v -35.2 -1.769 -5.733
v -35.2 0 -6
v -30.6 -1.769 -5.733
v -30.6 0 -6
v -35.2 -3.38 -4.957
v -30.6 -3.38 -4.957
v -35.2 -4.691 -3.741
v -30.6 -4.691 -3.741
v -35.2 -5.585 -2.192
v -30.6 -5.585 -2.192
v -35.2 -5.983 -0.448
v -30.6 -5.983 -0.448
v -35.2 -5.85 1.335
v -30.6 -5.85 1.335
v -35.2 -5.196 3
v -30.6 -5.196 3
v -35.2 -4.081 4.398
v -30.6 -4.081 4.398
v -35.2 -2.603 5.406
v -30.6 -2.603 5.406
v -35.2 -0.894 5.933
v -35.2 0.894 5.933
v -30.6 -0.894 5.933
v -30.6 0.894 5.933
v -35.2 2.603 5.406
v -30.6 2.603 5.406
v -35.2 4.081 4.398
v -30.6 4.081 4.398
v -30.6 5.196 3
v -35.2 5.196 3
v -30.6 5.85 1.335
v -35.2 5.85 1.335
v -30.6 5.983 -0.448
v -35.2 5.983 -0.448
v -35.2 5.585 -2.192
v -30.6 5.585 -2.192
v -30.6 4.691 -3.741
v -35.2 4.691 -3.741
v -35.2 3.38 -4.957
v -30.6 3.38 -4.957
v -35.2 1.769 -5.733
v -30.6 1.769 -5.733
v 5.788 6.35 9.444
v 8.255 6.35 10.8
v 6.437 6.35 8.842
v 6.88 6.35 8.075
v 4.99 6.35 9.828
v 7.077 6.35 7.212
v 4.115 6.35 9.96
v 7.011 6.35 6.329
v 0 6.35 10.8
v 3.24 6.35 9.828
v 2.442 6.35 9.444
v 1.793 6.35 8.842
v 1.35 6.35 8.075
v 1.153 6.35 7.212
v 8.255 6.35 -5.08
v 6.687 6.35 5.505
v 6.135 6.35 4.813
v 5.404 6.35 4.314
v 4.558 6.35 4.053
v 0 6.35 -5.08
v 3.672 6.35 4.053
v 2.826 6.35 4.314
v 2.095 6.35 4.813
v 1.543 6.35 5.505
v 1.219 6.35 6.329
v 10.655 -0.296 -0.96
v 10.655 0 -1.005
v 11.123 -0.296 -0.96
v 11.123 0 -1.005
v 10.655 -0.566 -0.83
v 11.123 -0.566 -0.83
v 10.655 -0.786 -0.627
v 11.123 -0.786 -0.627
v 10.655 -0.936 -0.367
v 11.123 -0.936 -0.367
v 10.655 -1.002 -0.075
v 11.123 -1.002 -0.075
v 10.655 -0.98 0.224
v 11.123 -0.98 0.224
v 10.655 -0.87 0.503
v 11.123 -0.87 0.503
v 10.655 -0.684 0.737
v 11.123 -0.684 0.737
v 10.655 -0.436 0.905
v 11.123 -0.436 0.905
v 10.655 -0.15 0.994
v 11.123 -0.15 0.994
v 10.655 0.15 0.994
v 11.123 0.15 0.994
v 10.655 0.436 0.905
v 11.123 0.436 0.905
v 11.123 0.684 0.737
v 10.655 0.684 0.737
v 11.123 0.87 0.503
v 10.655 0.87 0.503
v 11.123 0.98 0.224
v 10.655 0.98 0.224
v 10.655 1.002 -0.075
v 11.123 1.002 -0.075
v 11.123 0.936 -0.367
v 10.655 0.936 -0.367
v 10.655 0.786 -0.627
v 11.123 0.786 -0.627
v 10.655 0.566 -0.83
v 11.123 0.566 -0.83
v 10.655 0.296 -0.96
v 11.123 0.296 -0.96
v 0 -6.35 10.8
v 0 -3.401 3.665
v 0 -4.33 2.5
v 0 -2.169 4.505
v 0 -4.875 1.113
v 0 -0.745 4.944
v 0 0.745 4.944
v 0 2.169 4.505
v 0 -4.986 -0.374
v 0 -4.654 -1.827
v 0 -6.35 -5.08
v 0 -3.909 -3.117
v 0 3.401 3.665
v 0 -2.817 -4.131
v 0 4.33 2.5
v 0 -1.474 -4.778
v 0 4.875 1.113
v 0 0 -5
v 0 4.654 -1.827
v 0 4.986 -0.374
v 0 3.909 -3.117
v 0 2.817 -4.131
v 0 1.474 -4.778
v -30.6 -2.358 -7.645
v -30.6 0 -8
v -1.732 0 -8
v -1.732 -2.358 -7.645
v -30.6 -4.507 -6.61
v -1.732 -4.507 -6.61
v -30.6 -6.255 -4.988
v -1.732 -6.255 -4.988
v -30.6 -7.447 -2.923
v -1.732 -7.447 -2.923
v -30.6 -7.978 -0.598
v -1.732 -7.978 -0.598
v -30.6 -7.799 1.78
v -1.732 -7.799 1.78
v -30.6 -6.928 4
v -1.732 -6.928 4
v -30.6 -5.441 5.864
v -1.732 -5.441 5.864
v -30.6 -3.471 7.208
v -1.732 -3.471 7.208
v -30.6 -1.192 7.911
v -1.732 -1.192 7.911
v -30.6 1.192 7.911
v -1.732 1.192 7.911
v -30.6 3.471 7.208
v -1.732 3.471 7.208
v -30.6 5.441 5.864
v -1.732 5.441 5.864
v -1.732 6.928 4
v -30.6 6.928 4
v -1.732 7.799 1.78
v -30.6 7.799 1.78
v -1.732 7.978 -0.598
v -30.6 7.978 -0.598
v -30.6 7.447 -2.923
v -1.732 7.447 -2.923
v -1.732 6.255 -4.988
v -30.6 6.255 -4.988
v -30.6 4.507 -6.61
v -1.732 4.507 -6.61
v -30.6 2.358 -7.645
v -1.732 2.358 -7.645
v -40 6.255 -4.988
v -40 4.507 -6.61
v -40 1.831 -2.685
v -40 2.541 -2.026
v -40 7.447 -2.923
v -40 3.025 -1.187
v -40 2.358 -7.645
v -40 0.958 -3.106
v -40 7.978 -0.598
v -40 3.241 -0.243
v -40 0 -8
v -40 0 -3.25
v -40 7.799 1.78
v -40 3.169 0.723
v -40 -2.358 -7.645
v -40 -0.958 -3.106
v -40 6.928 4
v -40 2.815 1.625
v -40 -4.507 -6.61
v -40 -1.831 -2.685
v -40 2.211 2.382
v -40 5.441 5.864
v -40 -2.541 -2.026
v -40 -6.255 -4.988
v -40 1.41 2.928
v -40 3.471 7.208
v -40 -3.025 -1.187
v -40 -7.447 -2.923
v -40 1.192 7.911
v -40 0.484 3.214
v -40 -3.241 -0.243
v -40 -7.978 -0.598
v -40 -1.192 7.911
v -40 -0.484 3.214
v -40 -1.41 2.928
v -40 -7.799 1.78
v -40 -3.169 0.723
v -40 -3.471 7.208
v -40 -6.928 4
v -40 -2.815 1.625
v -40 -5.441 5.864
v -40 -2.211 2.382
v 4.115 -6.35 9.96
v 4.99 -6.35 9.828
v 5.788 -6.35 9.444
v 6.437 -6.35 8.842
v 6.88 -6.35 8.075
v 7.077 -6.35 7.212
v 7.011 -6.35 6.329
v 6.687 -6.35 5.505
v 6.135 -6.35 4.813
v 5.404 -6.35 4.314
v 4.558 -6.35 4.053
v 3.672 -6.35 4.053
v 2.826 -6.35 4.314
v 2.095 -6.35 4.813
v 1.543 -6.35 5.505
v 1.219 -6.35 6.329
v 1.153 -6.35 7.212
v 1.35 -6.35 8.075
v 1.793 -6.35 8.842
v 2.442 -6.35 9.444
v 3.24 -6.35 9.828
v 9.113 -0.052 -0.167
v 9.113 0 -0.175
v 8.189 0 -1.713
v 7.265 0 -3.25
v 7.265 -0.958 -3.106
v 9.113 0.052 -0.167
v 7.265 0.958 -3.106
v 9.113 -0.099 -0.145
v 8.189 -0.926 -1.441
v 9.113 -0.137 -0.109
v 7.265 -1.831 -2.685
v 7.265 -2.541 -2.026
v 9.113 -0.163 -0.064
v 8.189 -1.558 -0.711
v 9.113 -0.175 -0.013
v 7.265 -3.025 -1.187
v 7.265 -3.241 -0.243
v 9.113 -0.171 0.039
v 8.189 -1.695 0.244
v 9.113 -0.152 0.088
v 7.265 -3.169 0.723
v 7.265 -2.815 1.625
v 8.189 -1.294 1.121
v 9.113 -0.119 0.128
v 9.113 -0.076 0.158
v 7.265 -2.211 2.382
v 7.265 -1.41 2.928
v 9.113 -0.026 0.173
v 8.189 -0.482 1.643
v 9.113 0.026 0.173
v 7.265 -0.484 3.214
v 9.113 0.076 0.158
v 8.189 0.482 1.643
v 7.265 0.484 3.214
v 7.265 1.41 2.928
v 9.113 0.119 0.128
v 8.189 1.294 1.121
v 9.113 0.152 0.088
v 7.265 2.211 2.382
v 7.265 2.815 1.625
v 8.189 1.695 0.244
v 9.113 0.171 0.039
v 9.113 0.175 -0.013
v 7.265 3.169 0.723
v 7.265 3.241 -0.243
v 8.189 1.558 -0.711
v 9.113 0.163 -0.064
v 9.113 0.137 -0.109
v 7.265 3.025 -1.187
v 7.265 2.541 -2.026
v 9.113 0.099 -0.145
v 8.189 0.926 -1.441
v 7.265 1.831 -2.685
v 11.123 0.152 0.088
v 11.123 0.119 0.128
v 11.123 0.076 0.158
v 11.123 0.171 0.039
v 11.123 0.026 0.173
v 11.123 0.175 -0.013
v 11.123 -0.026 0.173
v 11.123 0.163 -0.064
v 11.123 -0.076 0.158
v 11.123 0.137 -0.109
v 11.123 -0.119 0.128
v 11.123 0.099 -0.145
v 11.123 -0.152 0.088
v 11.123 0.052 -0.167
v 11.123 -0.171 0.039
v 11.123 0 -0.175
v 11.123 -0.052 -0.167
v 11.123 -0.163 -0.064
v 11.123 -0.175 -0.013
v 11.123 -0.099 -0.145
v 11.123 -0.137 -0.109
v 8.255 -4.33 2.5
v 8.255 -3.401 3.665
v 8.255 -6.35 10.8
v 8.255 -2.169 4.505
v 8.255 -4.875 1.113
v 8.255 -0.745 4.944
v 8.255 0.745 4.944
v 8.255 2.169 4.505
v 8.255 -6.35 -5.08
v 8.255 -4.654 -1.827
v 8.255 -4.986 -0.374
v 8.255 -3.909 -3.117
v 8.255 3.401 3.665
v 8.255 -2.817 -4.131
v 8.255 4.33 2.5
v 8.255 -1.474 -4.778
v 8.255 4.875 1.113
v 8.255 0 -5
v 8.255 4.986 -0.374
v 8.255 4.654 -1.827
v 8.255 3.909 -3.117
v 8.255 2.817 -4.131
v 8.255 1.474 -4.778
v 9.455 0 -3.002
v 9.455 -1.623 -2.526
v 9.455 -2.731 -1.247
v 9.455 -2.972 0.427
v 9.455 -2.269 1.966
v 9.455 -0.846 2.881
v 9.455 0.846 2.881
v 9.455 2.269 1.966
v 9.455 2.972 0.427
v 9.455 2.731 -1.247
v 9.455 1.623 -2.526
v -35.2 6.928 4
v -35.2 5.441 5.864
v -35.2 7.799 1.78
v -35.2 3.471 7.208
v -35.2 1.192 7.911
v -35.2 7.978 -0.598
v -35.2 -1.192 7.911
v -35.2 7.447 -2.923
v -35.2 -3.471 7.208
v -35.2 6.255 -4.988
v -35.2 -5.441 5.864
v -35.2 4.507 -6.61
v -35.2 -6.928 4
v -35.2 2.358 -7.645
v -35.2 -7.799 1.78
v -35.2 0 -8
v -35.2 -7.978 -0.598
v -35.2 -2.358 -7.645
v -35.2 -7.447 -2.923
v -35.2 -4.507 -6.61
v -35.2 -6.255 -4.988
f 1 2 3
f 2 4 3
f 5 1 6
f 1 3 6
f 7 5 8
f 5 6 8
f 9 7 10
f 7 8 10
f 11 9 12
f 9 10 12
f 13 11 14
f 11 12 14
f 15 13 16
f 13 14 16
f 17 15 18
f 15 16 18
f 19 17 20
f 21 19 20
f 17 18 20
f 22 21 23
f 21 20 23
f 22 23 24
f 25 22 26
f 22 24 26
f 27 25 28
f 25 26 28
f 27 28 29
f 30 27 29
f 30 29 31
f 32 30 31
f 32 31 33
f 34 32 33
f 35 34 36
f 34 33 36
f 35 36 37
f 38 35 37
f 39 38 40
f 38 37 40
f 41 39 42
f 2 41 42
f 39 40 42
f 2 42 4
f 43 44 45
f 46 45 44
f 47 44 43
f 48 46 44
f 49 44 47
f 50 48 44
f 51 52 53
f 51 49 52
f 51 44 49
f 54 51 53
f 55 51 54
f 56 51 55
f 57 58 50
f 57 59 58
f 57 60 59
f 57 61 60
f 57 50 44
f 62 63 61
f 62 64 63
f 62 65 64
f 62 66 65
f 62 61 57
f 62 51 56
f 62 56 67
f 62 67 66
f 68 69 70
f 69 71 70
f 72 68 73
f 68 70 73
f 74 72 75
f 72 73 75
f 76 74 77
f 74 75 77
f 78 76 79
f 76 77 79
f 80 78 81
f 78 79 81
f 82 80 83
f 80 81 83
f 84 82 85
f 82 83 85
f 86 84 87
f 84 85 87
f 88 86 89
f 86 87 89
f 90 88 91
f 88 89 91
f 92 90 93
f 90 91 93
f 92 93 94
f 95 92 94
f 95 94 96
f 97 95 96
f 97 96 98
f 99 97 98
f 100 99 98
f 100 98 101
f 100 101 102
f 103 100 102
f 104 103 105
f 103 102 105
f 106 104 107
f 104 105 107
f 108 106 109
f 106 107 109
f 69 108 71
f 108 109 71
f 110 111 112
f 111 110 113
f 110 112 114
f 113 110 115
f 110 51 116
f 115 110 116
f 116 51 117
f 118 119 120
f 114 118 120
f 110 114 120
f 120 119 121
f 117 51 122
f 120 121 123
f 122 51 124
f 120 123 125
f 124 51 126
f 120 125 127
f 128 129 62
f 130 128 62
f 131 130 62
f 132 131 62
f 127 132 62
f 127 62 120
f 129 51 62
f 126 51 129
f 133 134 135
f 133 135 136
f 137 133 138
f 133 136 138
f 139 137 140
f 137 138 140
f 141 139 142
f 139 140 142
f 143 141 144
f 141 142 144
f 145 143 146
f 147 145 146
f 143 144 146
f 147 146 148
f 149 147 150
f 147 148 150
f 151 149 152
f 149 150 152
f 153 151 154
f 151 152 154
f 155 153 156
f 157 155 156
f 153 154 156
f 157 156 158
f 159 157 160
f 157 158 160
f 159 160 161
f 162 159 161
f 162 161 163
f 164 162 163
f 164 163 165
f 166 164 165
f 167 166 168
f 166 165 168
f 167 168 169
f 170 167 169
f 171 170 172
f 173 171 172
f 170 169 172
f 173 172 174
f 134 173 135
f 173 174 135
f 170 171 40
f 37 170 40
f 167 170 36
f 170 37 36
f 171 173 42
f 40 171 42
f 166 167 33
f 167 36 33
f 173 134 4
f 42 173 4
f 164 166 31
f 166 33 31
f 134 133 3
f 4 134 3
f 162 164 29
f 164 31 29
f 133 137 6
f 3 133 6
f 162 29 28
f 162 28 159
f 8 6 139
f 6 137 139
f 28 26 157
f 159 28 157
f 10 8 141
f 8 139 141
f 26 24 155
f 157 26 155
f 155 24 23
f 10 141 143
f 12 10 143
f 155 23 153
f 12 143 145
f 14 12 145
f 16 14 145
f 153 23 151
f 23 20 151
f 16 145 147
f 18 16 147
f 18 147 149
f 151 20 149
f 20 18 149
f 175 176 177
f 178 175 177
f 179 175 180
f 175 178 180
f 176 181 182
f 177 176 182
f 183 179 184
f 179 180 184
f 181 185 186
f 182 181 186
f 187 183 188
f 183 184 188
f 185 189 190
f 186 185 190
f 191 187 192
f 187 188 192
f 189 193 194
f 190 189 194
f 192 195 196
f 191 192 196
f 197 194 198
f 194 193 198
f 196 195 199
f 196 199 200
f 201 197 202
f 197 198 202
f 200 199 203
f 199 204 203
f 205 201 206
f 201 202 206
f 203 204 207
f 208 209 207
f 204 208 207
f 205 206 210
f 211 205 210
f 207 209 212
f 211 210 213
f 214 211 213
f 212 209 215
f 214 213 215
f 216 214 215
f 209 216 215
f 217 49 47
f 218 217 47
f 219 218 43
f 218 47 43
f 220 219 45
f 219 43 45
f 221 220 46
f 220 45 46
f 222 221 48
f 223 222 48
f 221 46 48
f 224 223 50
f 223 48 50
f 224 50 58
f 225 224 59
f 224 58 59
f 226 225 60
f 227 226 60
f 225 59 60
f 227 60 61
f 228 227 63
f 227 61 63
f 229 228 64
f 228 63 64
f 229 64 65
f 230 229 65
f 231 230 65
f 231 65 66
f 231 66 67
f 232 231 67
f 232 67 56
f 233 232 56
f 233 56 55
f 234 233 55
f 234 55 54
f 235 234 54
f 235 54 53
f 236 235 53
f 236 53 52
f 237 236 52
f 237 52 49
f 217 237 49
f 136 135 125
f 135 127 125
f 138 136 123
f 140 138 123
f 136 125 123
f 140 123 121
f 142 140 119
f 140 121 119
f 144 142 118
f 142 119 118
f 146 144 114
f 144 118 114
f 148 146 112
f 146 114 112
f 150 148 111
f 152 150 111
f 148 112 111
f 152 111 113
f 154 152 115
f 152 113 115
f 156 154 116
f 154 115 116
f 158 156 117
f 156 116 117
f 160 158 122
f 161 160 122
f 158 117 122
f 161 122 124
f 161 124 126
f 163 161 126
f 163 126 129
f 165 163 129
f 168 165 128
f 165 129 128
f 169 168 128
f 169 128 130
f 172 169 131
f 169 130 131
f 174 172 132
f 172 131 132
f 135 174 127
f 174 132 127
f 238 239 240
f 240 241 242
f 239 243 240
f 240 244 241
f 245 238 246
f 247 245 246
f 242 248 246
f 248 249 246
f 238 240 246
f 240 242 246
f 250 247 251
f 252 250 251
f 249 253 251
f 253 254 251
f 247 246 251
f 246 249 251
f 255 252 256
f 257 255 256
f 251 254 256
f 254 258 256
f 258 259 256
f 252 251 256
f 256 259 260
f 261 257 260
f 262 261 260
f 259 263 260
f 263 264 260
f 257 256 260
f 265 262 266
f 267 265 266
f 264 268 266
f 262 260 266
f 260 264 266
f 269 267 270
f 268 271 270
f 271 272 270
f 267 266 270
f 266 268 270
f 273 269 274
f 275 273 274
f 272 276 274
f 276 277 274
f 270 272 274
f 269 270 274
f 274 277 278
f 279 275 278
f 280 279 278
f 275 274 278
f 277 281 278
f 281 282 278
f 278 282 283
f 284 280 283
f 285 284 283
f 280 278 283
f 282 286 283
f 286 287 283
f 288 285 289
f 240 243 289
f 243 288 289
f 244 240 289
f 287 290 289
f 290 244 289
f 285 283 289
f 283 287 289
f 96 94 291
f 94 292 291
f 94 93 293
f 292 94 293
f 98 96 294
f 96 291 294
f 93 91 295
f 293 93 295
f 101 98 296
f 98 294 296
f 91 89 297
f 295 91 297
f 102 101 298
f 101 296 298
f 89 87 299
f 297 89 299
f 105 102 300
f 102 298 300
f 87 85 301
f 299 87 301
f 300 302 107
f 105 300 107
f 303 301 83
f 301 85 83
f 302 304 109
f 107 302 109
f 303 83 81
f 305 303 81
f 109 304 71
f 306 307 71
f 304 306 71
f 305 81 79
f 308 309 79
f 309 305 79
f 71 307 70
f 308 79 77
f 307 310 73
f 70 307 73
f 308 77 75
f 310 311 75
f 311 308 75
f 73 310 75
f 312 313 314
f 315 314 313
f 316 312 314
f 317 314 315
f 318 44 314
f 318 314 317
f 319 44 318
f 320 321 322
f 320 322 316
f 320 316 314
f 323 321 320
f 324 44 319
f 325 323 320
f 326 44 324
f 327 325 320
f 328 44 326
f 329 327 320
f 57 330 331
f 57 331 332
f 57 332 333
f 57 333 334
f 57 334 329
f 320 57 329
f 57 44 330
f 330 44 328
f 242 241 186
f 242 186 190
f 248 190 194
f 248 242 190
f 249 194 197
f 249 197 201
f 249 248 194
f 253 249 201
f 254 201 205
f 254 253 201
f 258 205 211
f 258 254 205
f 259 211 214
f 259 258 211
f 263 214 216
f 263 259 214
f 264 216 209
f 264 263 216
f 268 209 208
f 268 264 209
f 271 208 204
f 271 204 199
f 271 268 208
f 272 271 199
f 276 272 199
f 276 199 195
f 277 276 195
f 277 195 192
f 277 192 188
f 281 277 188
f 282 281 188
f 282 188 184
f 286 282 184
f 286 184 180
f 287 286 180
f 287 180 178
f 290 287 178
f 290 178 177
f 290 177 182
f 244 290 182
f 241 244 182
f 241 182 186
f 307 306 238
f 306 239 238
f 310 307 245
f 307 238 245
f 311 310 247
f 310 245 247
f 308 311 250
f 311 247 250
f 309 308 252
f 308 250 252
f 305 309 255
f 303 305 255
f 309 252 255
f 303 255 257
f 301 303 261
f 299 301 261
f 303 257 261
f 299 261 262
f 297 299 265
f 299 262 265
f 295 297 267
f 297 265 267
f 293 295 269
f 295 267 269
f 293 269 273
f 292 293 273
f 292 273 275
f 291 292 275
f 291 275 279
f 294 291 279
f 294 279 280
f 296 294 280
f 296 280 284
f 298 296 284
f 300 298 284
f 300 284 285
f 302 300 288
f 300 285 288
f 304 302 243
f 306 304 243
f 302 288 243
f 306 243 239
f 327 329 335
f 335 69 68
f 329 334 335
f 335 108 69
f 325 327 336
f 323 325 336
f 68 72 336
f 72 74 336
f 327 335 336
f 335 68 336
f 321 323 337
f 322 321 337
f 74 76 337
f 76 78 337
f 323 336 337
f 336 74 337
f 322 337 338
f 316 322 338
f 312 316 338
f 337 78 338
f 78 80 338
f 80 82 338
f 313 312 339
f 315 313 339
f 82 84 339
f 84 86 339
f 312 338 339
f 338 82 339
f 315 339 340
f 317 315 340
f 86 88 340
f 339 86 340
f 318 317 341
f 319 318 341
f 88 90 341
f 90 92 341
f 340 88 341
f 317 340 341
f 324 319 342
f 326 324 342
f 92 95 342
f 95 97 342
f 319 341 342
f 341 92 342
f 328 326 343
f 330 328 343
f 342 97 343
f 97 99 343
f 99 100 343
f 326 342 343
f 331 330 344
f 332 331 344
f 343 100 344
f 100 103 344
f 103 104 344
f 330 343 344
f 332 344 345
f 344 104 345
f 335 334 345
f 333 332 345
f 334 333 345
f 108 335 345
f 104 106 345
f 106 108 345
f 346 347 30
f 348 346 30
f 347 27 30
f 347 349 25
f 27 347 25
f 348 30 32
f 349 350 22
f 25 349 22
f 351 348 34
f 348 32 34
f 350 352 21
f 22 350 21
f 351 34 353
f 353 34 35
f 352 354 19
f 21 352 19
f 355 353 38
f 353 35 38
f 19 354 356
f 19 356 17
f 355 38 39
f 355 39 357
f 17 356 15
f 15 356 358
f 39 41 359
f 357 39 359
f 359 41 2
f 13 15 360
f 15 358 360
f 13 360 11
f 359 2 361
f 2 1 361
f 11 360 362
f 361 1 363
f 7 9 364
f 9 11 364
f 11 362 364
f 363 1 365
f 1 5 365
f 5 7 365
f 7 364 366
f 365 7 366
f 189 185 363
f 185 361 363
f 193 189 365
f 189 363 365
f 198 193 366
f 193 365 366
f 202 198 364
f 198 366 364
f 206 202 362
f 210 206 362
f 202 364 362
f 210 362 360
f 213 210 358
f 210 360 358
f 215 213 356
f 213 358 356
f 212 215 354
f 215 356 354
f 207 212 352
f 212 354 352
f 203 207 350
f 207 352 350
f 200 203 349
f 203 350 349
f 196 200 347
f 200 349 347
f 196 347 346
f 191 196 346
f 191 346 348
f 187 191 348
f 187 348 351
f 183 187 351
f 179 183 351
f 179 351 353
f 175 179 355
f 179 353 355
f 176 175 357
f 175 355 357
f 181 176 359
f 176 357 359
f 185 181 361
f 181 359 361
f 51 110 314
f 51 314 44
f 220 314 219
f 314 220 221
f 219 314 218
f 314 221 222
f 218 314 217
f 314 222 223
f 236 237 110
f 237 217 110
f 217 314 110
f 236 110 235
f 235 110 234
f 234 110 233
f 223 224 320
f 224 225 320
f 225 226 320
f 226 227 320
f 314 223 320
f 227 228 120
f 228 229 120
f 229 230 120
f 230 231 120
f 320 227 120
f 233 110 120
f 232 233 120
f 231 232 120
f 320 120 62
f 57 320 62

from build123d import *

# Parameters (mm, degrees)
SKETCH2_W           = 15.88
SKETCH2_H           = 12.7
SKETCH2_R           = 3.25
BOSS_EXTRUDE1_DEPTH = 8.255
SKETCH3_R           = 2.97
CUT_EXTRUDE1_DEPTH  = 44.847035248


with BuildPart() as part:
    # Sketch1 → Revolve1 (revolve)
    with BuildSketch(Plane(origin=(0, 0, 0), x_dir=(1, 0, 0), z_dir=(0, 1, 0))):
        Polygon((-40, 8), (-35.2, 8), (-35.2, 6), (-30.6, 6), (-30.6, 8), (-1.732050808, 8), (0, 5), (8.255, 5), (10.655438173, 1.005), (11.122943817, 1.005), (11.122943817, 0.175), (9.112544042, 0.175), (7.264897638, 3.25), (0, 3.25), (-40, 3.25), align=None)
    revolve(axis=Axis((0, 0, 0), (-1, 0, 0)))

    # Sketch2 → Boss-Extrude1 (add)
    with BuildSketch(Plane(origin=(0, 0, 0), x_dir=(0, 0, -1), z_dir=(1, 0, 0))):
        with Locations((-2.86, 0)):
            Rectangle(SKETCH2_W, SKETCH2_H)
        Circle(SKETCH2_R, mode=Mode.SUBTRACT)
    extrude(amount=BOSS_EXTRUDE1_DEPTH)

    # Sketch3 → Cut-Extrude1 (cut, through all)
    with BuildSketch(Plane(origin=(0, 6.35, 0), x_dir=(1, 0, 0), z_dir=(0, 1, 0))):
        with Locations(Location((4.115, -6.99, 0), (0, 0, 270))):
            Circle(SKETCH3_R)
    extrude(amount=-CUT_EXTRUDE1_DEPTH, mode=Mode.SUBTRACT)


solid = part.part
